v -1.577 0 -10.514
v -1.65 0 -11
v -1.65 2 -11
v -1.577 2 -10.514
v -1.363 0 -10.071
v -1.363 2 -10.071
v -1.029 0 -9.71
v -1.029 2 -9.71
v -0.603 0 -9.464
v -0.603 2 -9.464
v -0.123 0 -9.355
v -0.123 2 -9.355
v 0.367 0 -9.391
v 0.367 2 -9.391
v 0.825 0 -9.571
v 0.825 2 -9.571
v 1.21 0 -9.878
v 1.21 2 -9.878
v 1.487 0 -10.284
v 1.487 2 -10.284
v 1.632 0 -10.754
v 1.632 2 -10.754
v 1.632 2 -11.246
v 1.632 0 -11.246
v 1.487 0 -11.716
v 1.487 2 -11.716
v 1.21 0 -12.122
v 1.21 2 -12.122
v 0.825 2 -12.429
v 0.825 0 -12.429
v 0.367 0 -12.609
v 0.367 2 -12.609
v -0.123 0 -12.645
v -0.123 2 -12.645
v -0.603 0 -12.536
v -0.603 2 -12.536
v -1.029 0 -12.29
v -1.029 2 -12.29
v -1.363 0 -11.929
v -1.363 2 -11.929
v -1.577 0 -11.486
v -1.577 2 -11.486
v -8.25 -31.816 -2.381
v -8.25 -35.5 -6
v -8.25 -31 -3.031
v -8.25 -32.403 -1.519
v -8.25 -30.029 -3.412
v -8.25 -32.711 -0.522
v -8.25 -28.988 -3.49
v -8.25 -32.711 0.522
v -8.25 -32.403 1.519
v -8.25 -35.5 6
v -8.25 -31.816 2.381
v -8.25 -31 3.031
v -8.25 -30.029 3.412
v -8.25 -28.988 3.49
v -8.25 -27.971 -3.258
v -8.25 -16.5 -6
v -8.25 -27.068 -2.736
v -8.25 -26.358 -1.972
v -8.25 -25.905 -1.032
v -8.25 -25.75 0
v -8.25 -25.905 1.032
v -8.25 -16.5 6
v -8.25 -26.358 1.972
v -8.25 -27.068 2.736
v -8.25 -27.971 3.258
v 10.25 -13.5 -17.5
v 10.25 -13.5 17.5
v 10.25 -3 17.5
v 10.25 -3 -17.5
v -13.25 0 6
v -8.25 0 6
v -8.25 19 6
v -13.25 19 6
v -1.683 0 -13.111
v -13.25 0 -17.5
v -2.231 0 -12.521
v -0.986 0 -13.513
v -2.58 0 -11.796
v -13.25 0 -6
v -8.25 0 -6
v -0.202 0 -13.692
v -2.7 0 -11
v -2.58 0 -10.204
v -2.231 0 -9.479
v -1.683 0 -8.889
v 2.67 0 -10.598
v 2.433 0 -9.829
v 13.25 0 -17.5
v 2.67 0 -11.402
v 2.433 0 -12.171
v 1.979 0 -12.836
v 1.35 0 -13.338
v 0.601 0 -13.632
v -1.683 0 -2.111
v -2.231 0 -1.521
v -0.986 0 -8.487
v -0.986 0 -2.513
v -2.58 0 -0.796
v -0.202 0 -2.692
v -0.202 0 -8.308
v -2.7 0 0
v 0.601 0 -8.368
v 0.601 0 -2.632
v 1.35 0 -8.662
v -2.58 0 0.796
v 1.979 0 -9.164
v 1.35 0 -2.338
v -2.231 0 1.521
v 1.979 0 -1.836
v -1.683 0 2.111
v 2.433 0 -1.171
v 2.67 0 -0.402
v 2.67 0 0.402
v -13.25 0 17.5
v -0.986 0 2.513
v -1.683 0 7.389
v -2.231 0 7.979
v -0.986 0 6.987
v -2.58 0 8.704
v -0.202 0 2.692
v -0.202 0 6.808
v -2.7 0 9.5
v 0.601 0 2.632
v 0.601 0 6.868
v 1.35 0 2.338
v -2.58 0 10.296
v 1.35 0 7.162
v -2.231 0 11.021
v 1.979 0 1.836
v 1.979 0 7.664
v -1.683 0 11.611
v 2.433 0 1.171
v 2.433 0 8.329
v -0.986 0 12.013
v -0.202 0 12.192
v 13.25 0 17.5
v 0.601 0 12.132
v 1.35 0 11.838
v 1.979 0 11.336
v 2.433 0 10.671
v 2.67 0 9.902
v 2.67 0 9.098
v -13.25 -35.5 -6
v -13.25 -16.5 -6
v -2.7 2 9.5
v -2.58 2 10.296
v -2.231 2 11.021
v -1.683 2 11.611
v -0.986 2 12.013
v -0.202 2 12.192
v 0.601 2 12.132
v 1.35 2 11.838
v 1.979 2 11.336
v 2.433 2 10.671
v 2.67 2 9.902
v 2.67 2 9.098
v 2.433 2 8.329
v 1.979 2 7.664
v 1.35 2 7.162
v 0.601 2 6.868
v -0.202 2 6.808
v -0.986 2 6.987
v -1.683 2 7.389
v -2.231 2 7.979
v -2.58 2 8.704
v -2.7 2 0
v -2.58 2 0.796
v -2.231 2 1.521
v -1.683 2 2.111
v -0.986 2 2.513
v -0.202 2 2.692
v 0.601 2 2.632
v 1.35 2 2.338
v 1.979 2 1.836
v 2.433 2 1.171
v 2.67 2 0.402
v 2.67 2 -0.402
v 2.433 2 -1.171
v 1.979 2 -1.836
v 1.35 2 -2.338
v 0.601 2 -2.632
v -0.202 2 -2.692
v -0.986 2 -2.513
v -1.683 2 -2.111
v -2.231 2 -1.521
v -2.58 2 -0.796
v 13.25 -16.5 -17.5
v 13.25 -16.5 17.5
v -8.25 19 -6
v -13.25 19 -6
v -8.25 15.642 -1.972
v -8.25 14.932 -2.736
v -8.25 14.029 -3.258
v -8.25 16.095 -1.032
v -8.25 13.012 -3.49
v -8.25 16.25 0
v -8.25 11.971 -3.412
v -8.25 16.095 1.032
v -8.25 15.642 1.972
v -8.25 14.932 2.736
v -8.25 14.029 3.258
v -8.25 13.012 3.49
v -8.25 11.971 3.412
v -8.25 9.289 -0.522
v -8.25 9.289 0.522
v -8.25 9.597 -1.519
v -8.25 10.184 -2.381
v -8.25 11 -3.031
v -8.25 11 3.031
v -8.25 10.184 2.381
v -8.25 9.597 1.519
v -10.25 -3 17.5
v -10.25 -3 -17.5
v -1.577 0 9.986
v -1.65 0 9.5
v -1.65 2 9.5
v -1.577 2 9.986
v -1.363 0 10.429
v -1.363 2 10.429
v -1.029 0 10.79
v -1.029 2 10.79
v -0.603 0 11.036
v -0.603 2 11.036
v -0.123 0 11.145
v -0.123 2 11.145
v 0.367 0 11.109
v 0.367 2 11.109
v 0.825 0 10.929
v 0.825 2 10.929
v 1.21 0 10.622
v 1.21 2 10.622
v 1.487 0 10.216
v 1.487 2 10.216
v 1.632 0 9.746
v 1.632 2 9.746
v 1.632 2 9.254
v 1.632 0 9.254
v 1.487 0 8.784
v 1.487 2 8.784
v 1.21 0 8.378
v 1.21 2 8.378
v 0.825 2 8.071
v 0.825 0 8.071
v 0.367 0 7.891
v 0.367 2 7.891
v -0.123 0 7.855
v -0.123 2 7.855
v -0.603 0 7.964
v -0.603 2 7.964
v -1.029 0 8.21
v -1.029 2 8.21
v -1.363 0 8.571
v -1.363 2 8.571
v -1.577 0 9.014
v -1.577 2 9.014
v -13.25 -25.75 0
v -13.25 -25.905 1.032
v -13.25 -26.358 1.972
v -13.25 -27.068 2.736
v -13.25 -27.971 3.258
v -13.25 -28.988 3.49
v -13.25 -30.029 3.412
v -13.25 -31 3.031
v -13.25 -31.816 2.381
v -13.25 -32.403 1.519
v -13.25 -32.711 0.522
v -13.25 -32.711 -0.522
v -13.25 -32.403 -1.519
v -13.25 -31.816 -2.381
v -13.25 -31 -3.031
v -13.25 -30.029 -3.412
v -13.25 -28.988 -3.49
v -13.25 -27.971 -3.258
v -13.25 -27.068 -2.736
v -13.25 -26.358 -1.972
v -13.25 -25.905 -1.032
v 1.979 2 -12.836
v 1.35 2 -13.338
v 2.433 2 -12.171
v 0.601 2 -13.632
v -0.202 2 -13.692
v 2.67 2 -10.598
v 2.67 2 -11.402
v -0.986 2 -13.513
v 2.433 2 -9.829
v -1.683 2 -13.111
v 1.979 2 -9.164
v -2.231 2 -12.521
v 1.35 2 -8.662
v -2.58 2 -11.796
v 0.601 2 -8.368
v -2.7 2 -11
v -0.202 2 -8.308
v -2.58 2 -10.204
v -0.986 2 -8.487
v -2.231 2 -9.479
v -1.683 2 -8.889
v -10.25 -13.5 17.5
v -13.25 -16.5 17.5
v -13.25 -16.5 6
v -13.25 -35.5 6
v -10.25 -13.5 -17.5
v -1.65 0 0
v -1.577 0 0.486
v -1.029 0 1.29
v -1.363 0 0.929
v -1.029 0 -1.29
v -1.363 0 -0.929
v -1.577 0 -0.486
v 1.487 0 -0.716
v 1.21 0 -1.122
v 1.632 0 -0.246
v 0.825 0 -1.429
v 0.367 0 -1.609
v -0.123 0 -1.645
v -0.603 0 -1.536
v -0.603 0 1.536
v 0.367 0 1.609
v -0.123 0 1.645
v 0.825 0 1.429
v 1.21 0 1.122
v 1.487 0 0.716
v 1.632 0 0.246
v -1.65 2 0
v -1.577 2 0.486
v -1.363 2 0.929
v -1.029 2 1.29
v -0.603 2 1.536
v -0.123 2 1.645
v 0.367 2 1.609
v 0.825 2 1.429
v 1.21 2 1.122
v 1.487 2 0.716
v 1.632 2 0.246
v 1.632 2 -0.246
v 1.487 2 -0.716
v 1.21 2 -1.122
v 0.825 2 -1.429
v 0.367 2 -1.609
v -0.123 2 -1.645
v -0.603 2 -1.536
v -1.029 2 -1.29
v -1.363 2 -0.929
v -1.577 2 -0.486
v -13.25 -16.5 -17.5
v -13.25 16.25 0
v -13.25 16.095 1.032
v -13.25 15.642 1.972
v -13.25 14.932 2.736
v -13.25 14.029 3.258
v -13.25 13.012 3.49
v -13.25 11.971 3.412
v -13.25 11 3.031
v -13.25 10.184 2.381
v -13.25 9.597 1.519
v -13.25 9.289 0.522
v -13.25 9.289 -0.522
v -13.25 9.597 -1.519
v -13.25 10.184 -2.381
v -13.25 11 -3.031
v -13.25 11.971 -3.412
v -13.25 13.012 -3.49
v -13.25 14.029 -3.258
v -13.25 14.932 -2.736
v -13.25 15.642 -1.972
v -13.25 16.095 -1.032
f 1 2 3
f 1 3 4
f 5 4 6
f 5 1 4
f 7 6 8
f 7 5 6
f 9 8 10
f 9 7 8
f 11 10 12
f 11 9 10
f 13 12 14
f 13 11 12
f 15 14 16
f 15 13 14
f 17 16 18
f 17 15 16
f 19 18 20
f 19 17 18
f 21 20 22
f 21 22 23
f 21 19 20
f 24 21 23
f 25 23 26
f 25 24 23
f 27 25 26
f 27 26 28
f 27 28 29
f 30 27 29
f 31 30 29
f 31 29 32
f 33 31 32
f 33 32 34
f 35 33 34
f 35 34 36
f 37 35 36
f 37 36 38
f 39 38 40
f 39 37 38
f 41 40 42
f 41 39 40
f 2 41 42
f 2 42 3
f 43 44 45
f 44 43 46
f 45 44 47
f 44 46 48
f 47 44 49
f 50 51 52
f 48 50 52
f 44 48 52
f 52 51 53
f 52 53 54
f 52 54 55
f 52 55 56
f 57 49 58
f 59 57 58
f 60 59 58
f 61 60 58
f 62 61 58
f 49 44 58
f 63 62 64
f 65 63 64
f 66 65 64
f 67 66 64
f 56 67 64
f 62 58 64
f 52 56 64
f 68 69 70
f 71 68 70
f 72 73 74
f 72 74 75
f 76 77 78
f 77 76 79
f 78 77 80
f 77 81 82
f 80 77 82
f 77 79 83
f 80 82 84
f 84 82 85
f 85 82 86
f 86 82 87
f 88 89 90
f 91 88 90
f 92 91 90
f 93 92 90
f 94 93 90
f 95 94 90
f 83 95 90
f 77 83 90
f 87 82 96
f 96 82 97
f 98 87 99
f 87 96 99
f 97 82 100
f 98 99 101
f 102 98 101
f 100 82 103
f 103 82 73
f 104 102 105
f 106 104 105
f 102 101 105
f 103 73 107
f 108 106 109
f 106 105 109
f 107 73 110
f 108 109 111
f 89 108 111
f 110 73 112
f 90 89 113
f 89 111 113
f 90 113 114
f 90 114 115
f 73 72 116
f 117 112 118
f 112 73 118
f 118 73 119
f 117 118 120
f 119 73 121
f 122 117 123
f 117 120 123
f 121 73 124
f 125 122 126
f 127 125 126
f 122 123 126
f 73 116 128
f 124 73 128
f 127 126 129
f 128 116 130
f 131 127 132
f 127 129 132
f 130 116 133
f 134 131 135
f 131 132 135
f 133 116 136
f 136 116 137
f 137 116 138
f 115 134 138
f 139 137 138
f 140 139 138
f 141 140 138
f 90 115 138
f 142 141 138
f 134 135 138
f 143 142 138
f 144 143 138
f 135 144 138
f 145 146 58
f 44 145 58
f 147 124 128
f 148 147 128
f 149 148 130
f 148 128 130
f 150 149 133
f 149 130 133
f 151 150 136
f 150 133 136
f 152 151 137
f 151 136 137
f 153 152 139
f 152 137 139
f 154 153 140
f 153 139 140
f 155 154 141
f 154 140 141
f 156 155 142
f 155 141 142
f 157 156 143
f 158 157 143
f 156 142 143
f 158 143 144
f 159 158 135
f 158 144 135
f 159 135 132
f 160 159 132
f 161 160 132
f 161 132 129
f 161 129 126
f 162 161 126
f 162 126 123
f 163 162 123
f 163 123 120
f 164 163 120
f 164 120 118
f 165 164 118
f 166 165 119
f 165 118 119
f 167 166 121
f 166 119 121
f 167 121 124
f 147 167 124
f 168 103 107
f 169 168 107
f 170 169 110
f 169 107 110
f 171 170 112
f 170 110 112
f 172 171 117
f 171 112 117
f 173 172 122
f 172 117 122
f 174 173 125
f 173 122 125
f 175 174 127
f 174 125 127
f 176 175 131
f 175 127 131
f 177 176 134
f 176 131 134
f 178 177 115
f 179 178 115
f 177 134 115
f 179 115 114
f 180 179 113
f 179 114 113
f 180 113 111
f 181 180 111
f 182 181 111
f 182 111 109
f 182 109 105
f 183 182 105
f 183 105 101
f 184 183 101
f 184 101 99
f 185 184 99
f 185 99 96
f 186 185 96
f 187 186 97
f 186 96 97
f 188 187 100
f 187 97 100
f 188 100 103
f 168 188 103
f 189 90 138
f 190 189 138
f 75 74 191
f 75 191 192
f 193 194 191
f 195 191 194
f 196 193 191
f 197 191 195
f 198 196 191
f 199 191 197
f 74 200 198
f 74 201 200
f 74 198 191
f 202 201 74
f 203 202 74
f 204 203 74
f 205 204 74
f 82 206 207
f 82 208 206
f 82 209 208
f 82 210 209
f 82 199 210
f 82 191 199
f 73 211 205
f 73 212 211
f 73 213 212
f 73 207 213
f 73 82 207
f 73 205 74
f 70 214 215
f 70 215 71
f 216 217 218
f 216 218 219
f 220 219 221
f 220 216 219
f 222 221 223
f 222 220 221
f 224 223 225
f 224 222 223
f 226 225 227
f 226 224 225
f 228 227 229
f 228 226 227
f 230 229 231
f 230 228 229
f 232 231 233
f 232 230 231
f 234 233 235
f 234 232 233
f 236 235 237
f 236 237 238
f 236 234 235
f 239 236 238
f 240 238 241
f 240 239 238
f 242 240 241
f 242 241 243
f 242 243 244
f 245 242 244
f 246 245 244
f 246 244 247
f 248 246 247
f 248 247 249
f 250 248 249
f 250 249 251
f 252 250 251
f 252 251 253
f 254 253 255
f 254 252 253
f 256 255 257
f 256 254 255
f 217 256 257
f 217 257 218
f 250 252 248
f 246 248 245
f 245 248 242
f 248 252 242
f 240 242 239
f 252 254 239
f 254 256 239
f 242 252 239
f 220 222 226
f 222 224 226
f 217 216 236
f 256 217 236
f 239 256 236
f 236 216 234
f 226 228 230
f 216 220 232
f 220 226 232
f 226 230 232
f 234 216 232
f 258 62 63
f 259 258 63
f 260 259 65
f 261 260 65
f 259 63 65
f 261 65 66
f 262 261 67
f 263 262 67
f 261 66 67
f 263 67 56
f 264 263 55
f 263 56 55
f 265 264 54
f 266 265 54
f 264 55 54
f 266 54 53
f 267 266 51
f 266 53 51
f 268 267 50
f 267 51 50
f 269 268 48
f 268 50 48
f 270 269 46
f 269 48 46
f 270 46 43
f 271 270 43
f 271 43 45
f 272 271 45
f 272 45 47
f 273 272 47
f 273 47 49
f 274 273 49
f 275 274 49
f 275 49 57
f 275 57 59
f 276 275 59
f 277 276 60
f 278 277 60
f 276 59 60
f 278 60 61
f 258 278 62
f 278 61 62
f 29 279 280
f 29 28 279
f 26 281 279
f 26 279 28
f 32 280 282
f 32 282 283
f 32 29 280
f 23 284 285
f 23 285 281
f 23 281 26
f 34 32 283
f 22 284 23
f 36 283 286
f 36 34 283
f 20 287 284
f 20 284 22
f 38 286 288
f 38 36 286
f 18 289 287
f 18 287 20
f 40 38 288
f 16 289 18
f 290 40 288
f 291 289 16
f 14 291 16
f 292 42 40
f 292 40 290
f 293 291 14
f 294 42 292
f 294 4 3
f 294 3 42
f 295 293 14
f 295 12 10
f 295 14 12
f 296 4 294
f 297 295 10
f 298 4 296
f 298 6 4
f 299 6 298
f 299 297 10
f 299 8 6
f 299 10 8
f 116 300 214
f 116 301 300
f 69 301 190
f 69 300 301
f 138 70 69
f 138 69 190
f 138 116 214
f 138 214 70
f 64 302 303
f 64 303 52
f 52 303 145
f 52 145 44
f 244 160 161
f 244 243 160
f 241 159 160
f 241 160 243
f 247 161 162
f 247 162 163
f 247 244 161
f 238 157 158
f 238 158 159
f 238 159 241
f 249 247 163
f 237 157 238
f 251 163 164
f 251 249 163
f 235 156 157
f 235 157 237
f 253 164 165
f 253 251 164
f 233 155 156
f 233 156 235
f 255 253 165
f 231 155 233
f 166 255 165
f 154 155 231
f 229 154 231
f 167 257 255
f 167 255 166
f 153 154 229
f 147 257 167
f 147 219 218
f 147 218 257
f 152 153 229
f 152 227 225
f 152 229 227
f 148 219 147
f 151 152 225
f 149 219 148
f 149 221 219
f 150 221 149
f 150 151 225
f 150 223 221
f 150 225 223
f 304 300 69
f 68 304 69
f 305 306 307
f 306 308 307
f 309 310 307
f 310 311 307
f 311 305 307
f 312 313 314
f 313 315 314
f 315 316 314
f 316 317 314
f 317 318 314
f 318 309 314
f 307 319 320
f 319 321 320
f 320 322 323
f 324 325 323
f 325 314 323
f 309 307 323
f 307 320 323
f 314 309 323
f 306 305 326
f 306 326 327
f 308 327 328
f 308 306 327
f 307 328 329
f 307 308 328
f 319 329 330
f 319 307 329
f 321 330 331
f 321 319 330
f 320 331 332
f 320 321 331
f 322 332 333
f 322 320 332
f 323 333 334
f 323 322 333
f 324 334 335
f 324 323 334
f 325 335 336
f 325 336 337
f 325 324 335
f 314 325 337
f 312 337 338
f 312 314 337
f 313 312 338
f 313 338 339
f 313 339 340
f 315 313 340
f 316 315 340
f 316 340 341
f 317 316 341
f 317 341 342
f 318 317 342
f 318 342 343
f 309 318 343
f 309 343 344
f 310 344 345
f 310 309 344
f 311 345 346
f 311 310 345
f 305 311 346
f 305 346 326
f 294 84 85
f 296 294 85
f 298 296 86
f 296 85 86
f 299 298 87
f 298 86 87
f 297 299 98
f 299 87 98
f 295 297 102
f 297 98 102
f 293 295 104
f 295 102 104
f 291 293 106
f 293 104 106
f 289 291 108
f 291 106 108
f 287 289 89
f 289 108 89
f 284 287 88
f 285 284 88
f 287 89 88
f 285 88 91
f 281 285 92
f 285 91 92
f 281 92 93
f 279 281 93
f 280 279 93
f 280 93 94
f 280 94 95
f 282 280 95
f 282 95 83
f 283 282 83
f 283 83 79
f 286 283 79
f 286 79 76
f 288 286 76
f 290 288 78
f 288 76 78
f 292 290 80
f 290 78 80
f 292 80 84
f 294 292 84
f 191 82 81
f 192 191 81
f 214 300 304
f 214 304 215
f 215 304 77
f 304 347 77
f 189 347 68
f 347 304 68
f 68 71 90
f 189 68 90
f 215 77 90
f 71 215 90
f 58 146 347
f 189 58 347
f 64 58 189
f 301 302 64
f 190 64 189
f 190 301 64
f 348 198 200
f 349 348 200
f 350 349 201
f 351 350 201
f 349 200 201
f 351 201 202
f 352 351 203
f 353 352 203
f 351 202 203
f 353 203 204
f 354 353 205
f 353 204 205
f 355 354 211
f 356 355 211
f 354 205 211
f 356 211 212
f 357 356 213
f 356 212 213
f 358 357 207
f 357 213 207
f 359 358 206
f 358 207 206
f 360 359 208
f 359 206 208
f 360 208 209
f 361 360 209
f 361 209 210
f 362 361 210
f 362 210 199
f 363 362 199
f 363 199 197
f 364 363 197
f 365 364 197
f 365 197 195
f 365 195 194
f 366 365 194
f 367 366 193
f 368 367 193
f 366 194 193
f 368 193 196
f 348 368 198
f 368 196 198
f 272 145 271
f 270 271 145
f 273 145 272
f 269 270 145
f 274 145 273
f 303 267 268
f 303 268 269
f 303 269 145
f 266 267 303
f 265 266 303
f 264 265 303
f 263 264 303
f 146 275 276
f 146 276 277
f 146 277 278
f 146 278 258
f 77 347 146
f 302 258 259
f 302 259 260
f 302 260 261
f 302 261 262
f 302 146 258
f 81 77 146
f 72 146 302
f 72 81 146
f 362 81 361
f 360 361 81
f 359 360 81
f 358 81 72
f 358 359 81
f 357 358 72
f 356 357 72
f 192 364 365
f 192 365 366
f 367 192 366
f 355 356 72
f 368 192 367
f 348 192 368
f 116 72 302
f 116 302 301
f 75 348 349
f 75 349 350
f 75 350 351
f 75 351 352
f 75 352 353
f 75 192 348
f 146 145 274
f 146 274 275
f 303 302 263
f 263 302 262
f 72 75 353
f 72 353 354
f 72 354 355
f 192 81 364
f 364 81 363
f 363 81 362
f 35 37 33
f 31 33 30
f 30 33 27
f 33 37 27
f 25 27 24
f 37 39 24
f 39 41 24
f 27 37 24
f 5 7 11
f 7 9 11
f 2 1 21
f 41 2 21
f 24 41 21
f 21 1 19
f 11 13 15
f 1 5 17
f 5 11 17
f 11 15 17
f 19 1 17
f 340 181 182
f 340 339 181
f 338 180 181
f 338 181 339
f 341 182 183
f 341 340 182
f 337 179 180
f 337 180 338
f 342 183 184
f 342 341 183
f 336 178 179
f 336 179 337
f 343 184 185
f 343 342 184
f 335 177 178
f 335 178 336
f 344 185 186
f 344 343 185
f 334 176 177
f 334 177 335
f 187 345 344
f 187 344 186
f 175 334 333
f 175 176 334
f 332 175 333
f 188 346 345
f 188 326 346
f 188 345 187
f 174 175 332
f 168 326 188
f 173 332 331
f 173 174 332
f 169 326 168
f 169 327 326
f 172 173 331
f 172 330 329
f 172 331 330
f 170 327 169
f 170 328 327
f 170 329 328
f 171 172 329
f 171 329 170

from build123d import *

# Parameters (mm, degrees)
F0_W      = 26.5
F0_H      = 35
F1_DEPTH  = 16.5
F2_W      = 20.5
F2_H      = 10.5
F3_DEPTH  = 35
F4_R      = 2.7
F4_R_2    = 1.65
F5_DEPTH  = 2
F6_W      = 5
F6_H      = 12
F7_DEPTH  = 19
F8_W      = 5
F8_H      = 12
F9_DEPTH  = 19
F10_R     = 3.5
F11_DEPTH = 5
F12_R     = 3.5
F13_DEPTH = 5


with BuildPart() as f1:
    # F0 (on Front) → F1 (new body)
    with BuildSketch(Plane.XZ):
        Rectangle(F0_W, F0_H)
    extrude(amount=F1_DEPTH)

    # F2 (on face) → F3 (cut)
    with BuildSketch(Plane.XY.offset(17.5)):
        with Locations((0, -8.25)):
            Rectangle(F2_W, F2_H)
    extrude(amount=-F3_DEPTH, mode=Mode.SUBTRACT)

    # F4 (on face) → F5 (join)
    with BuildSketch(Plane(origin=(0, 0, 0), x_dir=(-1, 0, 0), z_dir=(0, 1, 0))):
        Circle(F4_R)
        Circle(F4_R_2, mode=Mode.SUBTRACT)
        with Locations((0, 9.5)):
            Circle(F4_R)
        with Locations((0, 9.5)):
            Circle(F4_R_2, mode=Mode.SUBTRACT)
        with Locations((0, -11)):
            Circle(F4_R)
        with Locations((0, -11)):
            Circle(F4_R_2, mode=Mode.SUBTRACT)
    extrude(amount=F5_DEPTH)

    # F6 (on face) → F7 (join)
    with BuildSketch(Plane.XZ.offset(16.5)):
        with Locations((-10.75, 0)):
            Rectangle(F6_W, F6_H)
    extrude(amount=F7_DEPTH)

    # F8 (on face) → F9 (join)
    with BuildSketch(Plane(origin=(0, 0, 0), x_dir=(-1, 0, 0), z_dir=(0, 1, 0))):
        with Locations((10.75, 0)):
            Rectangle(F8_W, F8_H)
    extrude(amount=F9_DEPTH)

    # F10 (on face) → F11 (cut)
    with BuildSketch(Plane.YZ.offset(-8.25)):
        with Locations((12.75, 0)):
            Circle(F10_R)
    extrude(amount=-F11_DEPTH, mode=Mode.SUBTRACT)

    # F12 (on face) → F13 (cut)
    with BuildSketch(Plane.YZ.offset(-8.25)):
        with Locations((-29.25, 0)):
            Circle(F12_R)
    extrude(amount=-F13_DEPTH, mode=Mode.SUBTRACT)


solid = f1.part
